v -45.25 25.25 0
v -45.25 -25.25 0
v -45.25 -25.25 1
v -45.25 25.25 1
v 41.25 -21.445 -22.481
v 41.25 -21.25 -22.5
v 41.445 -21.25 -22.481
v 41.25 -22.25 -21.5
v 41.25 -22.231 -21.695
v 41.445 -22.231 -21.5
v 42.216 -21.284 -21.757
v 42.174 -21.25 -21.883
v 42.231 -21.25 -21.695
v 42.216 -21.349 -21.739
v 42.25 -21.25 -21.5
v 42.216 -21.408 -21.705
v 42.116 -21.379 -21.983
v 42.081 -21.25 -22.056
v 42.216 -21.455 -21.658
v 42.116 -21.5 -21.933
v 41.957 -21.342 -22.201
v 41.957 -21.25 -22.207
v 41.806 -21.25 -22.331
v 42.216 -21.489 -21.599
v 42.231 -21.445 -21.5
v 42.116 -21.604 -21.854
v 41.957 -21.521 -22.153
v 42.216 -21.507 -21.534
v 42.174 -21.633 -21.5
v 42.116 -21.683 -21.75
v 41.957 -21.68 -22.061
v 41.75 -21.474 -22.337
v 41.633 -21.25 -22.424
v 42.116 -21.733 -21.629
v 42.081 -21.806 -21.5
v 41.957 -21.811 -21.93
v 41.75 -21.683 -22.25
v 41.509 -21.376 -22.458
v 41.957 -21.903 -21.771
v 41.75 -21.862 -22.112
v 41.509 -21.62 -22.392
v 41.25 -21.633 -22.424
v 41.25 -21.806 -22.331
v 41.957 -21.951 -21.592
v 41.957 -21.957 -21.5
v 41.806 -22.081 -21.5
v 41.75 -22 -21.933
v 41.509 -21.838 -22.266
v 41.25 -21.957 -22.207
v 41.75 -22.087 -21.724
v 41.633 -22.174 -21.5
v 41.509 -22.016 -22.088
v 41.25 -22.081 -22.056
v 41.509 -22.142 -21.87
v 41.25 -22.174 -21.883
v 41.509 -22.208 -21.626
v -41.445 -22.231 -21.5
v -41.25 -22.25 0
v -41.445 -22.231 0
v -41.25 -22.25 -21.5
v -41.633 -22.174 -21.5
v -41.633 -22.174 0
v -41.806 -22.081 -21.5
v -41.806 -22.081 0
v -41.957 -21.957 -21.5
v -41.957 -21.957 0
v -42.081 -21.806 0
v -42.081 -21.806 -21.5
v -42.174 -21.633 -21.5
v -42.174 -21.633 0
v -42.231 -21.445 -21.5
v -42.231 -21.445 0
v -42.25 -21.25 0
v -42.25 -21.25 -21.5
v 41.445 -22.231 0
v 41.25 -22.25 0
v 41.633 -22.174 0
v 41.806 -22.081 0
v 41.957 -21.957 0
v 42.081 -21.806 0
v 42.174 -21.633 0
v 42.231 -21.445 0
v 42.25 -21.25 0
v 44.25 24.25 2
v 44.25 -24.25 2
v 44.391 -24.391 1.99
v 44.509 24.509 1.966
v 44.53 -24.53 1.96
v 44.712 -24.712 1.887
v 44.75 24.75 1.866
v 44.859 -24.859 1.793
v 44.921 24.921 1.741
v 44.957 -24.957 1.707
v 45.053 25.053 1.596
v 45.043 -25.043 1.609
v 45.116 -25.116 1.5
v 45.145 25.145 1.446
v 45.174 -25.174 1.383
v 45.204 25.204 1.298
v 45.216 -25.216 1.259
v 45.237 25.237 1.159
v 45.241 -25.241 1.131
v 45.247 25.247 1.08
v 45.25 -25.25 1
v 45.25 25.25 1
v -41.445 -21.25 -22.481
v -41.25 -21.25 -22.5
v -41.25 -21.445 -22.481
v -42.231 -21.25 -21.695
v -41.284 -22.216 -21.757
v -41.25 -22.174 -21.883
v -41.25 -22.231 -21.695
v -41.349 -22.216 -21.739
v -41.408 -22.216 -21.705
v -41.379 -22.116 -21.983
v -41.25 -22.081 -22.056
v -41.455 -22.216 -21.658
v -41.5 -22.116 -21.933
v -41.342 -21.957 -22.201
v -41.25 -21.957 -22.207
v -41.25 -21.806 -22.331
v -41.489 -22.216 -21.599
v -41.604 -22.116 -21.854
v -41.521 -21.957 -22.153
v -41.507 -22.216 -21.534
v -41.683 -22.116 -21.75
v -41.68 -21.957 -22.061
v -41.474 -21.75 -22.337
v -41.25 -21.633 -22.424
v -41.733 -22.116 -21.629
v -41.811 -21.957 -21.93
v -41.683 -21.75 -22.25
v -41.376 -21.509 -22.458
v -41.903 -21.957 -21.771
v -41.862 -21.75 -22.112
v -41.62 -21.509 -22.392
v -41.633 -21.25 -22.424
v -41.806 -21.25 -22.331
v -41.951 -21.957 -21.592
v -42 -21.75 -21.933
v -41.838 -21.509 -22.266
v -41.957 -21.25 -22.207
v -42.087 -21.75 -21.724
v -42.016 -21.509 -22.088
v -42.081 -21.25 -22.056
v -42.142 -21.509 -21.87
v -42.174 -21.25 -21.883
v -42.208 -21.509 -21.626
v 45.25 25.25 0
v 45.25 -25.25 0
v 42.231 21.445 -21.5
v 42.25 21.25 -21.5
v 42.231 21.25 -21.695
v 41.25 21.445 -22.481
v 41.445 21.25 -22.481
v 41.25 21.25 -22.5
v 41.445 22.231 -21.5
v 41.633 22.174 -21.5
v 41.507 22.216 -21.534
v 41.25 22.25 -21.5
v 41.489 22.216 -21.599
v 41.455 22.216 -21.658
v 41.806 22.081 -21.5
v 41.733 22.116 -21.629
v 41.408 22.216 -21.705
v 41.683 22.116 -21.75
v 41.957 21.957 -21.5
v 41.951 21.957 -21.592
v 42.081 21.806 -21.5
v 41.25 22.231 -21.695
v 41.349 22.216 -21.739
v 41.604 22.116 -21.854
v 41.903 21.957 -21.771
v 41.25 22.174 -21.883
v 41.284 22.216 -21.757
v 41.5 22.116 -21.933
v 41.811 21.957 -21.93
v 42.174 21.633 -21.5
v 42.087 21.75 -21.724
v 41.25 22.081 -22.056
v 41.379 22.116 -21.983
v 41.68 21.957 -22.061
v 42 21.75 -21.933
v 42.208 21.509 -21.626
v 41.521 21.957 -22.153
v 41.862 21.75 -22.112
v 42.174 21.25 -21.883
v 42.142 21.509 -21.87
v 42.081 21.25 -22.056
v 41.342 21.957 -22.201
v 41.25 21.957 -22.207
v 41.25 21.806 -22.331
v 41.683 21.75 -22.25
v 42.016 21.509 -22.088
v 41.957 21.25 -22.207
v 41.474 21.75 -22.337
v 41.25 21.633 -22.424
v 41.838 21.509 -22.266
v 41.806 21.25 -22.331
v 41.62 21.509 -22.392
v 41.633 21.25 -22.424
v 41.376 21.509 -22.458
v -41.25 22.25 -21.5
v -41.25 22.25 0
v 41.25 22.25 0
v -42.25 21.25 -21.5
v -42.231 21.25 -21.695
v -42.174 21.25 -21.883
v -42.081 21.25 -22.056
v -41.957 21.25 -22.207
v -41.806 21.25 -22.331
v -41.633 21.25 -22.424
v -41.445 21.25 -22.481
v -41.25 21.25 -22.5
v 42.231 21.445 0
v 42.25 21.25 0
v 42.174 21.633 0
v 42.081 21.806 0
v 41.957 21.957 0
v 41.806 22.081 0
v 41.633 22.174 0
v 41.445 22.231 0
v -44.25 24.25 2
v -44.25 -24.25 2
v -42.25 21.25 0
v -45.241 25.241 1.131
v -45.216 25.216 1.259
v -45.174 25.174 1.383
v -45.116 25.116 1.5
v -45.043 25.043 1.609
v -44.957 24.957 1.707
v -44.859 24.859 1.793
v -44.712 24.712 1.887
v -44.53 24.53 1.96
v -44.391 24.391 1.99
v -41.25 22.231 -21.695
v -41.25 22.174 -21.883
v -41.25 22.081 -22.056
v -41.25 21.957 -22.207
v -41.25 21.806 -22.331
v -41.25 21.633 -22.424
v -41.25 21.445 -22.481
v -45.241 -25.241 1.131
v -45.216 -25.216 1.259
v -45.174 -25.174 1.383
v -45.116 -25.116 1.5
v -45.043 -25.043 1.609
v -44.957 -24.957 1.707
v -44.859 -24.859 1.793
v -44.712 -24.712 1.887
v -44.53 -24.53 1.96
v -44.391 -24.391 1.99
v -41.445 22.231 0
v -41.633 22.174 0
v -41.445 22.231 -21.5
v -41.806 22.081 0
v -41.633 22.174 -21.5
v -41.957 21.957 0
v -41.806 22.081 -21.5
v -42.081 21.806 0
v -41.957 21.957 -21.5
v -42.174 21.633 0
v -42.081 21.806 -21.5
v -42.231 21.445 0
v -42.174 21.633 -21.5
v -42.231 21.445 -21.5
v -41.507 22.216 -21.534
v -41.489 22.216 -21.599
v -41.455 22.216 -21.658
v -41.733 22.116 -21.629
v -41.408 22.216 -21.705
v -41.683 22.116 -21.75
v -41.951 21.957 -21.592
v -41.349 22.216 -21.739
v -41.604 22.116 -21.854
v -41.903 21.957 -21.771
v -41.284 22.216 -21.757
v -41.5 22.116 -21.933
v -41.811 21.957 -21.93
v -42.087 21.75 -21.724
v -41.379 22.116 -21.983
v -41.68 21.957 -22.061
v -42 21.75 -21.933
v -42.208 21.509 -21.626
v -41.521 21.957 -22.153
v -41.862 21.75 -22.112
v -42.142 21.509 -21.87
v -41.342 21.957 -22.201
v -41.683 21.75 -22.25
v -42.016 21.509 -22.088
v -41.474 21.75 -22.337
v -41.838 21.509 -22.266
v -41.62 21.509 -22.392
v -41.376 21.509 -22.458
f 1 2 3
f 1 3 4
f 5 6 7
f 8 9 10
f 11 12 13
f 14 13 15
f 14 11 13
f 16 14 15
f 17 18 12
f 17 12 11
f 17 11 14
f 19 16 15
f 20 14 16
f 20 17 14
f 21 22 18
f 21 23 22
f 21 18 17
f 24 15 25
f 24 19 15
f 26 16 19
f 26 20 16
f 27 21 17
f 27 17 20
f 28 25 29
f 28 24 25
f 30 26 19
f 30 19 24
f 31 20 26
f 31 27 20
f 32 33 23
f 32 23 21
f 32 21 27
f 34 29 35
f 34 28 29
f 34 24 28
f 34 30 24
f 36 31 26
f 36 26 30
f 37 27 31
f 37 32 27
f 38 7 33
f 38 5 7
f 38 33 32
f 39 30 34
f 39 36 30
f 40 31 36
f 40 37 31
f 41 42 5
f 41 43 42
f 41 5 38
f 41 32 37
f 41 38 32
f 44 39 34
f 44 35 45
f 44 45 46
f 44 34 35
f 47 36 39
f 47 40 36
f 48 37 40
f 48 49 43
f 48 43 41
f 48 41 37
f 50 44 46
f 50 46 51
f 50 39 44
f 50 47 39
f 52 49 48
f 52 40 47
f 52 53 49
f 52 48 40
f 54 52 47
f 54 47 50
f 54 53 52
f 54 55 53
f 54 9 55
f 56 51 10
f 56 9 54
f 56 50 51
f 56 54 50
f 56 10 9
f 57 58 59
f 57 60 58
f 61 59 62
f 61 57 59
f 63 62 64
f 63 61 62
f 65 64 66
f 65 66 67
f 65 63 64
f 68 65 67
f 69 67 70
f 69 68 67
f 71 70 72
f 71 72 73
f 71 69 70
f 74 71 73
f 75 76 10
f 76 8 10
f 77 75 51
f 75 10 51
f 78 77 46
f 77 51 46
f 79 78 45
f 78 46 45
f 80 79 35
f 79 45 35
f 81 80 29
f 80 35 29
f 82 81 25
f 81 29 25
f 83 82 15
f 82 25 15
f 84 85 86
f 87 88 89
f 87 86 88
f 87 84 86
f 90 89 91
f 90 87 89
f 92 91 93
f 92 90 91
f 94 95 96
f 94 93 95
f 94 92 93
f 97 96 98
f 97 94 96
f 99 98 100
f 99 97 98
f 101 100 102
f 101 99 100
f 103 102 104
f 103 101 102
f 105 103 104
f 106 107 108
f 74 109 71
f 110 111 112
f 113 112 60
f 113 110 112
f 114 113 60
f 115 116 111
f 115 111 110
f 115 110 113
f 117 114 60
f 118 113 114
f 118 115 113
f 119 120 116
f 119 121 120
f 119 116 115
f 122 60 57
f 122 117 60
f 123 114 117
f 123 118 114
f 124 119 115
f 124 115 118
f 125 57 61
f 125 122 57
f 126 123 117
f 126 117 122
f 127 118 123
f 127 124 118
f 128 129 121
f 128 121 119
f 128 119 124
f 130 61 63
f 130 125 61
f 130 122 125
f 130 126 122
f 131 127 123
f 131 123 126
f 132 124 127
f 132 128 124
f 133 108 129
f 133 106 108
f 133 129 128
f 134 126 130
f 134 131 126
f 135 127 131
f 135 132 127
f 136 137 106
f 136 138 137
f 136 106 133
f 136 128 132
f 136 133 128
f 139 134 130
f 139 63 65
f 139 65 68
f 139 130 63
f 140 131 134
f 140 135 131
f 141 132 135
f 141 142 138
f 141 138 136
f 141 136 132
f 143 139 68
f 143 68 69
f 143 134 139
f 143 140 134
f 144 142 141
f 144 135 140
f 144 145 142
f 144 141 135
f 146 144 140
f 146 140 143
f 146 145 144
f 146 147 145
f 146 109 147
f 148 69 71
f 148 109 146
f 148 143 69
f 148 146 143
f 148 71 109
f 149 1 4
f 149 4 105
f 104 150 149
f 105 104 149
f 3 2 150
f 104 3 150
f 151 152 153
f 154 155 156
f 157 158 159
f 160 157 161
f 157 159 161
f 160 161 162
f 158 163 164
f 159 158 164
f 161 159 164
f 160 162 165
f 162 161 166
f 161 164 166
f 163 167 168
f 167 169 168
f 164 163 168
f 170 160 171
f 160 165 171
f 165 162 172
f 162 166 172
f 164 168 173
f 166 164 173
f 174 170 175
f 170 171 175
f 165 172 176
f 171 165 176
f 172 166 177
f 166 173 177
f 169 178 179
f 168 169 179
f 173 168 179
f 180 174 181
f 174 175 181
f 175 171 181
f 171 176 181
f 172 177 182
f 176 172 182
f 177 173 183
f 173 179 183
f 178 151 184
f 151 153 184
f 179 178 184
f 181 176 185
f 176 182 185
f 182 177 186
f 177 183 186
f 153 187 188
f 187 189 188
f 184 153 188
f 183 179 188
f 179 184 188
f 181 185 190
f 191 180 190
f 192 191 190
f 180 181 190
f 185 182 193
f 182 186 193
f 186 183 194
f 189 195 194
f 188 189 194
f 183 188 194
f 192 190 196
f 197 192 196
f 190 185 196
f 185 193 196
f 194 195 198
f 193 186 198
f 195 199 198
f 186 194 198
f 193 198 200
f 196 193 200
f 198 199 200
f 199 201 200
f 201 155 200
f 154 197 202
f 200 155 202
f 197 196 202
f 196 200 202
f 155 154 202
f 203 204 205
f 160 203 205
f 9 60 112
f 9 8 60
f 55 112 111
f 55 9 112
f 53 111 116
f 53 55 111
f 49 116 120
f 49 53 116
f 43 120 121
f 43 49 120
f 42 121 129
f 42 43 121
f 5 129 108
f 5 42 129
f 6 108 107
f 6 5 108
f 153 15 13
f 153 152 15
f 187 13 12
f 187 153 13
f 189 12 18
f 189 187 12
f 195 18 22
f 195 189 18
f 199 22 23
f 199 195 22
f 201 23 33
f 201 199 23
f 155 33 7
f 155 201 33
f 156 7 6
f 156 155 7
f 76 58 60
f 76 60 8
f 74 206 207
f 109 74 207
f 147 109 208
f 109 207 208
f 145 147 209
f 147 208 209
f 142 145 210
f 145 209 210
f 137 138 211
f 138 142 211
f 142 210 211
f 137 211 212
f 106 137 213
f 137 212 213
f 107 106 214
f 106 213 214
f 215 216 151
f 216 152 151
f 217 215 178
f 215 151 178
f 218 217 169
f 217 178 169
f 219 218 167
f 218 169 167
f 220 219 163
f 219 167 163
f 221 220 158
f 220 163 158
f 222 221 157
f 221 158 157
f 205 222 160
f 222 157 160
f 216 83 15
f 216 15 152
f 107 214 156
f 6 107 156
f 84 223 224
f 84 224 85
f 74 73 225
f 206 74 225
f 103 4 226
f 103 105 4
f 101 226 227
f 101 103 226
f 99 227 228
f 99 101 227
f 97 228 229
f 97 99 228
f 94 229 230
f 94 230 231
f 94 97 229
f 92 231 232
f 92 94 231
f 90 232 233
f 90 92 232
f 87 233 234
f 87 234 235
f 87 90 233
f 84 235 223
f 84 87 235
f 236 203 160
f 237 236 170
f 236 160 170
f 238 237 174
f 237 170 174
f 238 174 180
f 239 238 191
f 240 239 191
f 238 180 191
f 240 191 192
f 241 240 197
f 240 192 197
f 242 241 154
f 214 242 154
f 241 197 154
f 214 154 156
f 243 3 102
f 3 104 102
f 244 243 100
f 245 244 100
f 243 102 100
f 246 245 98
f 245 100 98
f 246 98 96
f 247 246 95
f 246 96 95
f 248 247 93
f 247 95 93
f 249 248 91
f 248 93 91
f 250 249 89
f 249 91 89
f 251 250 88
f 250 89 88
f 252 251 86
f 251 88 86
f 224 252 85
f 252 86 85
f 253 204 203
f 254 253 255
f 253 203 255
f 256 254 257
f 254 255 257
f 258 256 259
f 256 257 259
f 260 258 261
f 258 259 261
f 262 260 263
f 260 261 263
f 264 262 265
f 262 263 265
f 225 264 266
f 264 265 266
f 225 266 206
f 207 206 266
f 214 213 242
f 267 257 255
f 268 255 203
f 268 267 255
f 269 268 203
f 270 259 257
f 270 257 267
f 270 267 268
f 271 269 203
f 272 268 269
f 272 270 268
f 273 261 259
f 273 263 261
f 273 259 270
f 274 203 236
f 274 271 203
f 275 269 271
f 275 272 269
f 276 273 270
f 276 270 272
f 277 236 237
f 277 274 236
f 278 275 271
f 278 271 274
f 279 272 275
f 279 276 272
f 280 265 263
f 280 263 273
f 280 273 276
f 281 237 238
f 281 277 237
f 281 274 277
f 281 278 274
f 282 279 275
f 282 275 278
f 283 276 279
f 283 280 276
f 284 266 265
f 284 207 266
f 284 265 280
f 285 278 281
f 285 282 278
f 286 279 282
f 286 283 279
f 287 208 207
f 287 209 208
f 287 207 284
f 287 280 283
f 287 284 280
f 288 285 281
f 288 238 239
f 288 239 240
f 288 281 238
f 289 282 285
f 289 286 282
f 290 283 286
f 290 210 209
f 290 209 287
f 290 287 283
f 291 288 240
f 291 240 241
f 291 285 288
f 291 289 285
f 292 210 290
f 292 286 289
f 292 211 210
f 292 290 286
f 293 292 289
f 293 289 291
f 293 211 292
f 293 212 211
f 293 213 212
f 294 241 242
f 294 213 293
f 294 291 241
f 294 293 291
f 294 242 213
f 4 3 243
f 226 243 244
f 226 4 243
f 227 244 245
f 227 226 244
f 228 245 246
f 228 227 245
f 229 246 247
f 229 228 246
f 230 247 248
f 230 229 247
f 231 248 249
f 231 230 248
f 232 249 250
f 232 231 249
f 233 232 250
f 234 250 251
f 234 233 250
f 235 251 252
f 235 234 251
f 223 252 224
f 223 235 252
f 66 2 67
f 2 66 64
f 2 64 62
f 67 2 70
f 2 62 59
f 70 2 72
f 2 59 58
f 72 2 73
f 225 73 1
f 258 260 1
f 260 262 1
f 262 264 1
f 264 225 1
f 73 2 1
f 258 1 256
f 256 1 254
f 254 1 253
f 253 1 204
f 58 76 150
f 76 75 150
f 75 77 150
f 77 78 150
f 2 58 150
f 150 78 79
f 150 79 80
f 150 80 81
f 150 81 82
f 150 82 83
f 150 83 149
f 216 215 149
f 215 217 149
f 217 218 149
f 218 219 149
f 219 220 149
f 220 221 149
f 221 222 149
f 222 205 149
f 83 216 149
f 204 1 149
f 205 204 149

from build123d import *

# Parameters (mm, degrees)
SKETCH1_W           = 84.5
SKETCH1_H           = 44.5
BOSS_EXTRUDE1_DEPTH = 22.5
SKETCH2_W           = 90.5
SKETCH2_H           = 50.5
BOSS_EXTRUDE2_DEPTH = 2
FILLET1_R           = 1


with BuildPart() as part:
    # Sketch1 → Boss-Extrude1 (new body)
    with BuildSketch(Plane.XY):
        Rectangle(SKETCH1_W, SKETCH1_H)
    extrude(amount=-BOSS_EXTRUDE1_DEPTH)

    # Sketch2 → Boss-Extrude2 (add)
    with BuildSketch(Plane.XY):
        Rectangle(SKETCH2_W, SKETCH2_H)
    extrude(amount=BOSS_EXTRUDE2_DEPTH)

    # Fillet1
    fillet1_edges = [part.edges().sort_by_distance(p)[0] for p in [
        (-42.25, 0, -22.5),
        (-45.25, 0, 2),
        (0, -25.25, 2),
        (45.25, 0, 2),
        (0, 25.25, 2),
        (0, -22.25, -22.5),
        (42.25, 0, -22.5),
        (42.25, -22.25, -11.25),
        (-42.25, -22.25, -11.25),
        (-42.25, 22.25, -11.25),
        (42.25, 22.25, -11.25),
        (0, 22.25, -22.5),
    ]]
    fillet(fillet1_edges, radius=FILLET1_R)


solid = part.part
